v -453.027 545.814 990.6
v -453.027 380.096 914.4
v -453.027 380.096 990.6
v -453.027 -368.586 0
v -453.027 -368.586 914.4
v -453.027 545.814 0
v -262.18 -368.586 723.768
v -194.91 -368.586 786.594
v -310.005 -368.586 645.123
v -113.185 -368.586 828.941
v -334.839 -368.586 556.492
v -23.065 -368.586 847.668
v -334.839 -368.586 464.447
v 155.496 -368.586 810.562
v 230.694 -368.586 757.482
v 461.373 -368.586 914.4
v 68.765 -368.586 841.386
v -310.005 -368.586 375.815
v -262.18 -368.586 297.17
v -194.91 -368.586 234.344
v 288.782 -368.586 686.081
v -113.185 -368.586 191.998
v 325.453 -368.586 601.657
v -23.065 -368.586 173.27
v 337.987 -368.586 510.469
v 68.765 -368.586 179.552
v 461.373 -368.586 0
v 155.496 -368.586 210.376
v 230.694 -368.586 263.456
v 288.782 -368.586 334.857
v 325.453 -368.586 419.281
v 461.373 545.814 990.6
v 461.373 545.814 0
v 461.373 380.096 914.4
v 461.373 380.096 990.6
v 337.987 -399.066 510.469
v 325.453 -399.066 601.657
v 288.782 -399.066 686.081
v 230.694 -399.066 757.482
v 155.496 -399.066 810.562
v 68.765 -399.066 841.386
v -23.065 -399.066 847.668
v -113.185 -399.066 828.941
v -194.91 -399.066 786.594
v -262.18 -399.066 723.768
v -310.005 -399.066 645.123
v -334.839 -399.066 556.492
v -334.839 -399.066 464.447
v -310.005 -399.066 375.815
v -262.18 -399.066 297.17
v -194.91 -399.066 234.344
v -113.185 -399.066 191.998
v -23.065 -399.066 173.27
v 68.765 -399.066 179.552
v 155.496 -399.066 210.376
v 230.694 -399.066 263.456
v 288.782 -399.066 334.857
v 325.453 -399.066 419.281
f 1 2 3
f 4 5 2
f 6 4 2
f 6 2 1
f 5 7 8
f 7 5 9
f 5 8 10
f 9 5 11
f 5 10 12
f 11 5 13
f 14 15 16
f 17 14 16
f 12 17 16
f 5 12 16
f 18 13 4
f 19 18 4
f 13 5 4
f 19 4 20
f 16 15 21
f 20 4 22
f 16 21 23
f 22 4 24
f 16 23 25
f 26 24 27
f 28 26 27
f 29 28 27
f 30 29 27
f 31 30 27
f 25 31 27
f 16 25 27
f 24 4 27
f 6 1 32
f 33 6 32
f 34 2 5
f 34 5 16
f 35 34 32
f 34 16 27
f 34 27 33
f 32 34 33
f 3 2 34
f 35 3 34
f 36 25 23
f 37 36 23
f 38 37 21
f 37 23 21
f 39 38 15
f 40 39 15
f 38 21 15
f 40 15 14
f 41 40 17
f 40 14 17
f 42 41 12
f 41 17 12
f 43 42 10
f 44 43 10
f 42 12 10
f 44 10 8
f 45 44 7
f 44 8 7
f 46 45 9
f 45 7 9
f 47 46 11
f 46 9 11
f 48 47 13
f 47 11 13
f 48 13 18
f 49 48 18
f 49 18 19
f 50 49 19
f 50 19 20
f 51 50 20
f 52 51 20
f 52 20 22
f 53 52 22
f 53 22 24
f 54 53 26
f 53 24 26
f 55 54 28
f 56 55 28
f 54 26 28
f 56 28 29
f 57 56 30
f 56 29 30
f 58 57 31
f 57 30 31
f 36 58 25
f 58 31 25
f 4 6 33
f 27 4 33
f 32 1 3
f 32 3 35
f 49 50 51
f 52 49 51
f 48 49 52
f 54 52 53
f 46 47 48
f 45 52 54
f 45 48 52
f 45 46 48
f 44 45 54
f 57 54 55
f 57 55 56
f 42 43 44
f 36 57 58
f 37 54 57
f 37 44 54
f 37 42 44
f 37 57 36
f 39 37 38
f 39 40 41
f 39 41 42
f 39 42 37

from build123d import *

# Parameters (mm, degrees)
F0_W     = 914.4
F0_H     = 914.4
F1_DEPTH = 914.4
F2_W     = 914.4
F2_H     = 165.717466
F3_DEPTH = 76.2
F4_R     = 337.986579
F5_DEPTH = 30.48


with BuildPart() as f1:
    # F0 (on Top) → F1 (new body)
    with BuildSketch(Plane.XY):
        with Locations((4.173182, 88.613961)):
            Rectangle(F0_W, F0_H)
    extrude(amount=F1_DEPTH)

    # F2 (on face) → F3 (join)
    with BuildSketch(Plane.XY.offset(914.4)):
        with Locations((4.173182, 462.955228)):
            Rectangle(F2_W, F2_H)
    extrude(amount=F3_DEPTH)

    # F4 (on face) → F5 (join)
    with BuildSketch(Plane.XZ.offset(368.586039)):
        with Locations((0, 510.469079)):
            Circle(F4_R)
    extrude(amount=F5_DEPTH)


solid = f1.part
